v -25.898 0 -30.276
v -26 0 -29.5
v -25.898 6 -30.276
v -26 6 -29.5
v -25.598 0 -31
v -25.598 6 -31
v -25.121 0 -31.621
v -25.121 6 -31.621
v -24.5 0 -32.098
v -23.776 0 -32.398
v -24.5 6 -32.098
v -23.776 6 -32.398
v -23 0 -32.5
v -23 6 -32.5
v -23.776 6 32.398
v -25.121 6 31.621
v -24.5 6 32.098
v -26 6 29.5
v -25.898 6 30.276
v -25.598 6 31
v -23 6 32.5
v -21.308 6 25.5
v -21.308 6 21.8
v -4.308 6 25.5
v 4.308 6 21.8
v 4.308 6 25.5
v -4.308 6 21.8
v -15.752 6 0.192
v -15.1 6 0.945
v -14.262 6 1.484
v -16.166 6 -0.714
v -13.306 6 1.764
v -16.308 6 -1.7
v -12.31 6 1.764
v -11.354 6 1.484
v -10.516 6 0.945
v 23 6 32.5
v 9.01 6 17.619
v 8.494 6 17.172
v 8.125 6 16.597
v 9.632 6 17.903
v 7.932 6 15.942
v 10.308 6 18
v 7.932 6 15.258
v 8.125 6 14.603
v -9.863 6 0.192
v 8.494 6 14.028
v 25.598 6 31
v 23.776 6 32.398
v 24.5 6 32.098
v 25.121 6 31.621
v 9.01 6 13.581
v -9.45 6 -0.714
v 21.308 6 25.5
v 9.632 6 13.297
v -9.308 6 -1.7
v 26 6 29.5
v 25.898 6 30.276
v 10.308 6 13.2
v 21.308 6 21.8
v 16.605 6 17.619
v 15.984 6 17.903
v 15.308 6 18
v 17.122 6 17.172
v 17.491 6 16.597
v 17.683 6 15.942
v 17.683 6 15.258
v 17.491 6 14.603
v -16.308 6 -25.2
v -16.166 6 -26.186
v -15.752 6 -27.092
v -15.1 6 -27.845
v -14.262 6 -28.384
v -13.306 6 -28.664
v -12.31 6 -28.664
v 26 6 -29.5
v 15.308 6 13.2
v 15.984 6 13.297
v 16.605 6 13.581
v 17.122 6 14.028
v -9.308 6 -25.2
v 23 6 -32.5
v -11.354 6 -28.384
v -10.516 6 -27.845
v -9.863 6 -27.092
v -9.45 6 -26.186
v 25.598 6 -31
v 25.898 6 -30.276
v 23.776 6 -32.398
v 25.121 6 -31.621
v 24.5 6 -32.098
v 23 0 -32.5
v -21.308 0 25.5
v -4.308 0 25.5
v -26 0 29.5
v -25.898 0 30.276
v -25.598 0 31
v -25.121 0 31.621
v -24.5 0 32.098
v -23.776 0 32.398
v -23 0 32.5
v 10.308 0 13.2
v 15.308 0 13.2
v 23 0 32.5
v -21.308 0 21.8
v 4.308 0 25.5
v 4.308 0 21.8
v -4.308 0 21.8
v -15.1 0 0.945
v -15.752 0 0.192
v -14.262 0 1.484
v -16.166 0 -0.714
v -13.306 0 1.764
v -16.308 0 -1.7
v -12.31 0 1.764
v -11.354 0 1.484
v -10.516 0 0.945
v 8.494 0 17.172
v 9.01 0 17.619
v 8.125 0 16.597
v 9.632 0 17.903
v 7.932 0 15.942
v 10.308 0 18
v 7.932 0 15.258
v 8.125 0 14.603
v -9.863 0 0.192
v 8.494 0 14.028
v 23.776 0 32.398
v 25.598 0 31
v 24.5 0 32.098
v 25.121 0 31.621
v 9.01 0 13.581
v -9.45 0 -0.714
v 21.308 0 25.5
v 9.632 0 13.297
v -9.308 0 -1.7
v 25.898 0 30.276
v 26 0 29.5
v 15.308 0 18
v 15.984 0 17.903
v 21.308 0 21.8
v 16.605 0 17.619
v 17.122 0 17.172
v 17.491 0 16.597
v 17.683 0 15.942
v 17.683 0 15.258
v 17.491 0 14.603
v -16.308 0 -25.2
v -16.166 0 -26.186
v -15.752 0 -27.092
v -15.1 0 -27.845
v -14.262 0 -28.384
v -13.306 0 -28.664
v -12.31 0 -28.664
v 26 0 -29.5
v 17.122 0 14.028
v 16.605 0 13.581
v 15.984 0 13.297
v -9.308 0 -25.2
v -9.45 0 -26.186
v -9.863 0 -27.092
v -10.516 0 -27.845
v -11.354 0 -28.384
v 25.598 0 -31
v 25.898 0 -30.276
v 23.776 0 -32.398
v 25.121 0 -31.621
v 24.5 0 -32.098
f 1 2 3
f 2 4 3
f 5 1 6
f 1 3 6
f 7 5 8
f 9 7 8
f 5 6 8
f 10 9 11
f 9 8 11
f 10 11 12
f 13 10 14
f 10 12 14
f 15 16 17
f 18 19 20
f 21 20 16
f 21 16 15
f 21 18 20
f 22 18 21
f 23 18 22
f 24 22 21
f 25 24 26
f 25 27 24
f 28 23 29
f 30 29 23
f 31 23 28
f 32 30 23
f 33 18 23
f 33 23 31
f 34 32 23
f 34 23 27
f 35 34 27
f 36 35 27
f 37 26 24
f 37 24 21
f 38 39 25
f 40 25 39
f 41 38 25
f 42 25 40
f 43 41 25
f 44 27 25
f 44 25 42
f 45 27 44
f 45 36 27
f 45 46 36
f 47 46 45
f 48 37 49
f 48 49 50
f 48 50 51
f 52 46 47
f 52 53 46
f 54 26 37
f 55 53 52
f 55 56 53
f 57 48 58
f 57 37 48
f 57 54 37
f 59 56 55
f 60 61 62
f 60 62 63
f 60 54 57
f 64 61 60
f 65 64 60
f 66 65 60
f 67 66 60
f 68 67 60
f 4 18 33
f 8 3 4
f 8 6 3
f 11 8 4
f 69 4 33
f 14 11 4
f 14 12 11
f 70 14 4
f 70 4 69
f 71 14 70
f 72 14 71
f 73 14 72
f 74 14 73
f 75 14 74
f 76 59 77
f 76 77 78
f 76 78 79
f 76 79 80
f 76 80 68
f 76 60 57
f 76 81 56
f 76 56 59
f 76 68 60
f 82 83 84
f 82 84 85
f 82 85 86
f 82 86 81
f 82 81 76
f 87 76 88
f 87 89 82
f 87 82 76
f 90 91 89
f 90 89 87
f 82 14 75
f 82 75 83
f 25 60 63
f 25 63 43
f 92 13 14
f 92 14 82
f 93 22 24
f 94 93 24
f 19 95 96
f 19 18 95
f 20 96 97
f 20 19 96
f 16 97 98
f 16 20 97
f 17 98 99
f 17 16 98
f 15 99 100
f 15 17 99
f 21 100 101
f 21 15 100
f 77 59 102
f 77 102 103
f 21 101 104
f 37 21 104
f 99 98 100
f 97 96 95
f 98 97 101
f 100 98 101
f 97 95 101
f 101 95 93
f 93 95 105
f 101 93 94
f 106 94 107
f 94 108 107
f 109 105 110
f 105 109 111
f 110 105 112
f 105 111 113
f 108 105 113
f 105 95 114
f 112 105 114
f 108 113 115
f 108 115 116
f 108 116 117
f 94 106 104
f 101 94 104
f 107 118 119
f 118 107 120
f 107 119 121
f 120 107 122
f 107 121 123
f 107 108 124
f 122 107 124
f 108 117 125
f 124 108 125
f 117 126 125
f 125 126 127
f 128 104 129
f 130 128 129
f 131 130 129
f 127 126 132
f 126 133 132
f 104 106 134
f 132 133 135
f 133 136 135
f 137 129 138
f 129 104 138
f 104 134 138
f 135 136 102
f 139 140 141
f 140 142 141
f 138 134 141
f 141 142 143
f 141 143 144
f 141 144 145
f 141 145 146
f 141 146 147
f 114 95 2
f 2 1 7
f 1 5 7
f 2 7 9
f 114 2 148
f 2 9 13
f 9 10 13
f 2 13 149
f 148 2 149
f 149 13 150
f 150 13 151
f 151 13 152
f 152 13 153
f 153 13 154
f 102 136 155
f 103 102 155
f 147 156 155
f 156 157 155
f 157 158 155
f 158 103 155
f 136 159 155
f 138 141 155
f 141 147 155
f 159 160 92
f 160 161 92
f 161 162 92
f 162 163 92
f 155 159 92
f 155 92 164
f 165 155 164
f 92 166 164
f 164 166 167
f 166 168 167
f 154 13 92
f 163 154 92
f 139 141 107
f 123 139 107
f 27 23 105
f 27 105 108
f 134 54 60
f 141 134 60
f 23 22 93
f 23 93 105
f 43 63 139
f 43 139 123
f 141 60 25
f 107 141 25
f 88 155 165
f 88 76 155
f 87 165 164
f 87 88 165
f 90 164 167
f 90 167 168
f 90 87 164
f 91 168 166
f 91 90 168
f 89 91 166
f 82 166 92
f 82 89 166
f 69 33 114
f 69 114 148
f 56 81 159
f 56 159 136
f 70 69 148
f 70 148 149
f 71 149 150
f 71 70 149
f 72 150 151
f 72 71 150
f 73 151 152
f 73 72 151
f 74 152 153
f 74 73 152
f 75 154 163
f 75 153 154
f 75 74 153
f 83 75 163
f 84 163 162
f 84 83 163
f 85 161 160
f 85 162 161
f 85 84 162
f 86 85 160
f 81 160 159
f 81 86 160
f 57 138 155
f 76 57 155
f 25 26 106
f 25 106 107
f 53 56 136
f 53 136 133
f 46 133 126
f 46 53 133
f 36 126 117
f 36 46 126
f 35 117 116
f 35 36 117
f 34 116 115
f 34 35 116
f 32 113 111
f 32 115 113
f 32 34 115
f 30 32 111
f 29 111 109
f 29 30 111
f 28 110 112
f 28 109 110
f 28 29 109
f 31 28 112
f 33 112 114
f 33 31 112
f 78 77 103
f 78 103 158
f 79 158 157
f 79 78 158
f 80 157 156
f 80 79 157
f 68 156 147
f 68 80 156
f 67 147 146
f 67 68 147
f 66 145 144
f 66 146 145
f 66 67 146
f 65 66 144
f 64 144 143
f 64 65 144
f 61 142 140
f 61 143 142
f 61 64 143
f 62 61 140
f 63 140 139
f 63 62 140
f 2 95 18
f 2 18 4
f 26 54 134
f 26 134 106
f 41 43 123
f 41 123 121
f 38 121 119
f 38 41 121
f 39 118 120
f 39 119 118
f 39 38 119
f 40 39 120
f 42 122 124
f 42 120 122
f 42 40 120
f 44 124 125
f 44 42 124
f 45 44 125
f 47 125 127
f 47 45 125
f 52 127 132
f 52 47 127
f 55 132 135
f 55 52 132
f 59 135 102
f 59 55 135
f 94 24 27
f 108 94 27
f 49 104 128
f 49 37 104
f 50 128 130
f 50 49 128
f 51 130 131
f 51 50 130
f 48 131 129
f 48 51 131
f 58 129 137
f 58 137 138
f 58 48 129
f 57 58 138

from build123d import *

# Parameters (mm, degrees)
SKETCH1_W           = 52
SKETCH1_H           = 65
BOSS_EXTRUDE1_DEPTH = 6
FILLET1_R           = 3
SKETCH4_W           = 17
SKETCH4_H           = 3.7
CUT_EXTRUDE1_DEPTH  = 7
CUT_EXTRUDE2_DEPTH  = 7
CUT_EXTRUDE3_DEPTH  = 7


with BuildPart() as part:
    # Sketch1 → Boss-Extrude1 (new body)
    with BuildSketch(Plane(origin=(0, 0, 0), x_dir=(1, 0, 0), z_dir=(0, 1, 0))):
        Rectangle(SKETCH1_W, SKETCH1_H)
    extrude(amount=BOSS_EXTRUDE1_DEPTH)

    # Fillet1
    fillet1_edges = [part.edges().sort_by_distance(p)[0] for p in [
        (26, 3, 32.5),
        (-26, 3, 32.5),
        (-26, 3, -32.5),
        (26, 3, -32.5),
    ]]
    fillet(fillet1_edges, radius=FILLET1_R)

    # Sketch4 → Cut-Extrude1 (cut, through all)
    with BuildSketch(Plane(origin=(0, 6, 0), x_dir=(1, 0, 0), z_dir=(0, 1, 0))):
        with Locations((-12.807771524, -23.65)):
            Rectangle(SKETCH4_W, SKETCH4_H)
    cut_extrude1 = extrude(amount=-CUT_EXTRUDE1_DEPTH, mode=Mode.SUBTRACT)

    # Mirror2: Cut-Extrude1 across plane
    add(cut_extrude1.mirror(Plane(origin=(0, 0, 0), x_dir=(0, 0, 1), z_dir=(1, 0, 0))), mode=Mode.SUBTRACT)

    # Sketch5 → Cut-Extrude2 (cut, through all)
    with BuildSketch(Plane(origin=(0, 6, 0), x_dir=(1, 0, 0), z_dir=(0, 1, 0))):
        with BuildLine():
            Line((10.307771524, -13.2), (15.307771524, -13.2))
            ThreePointArc((15.307771524, -13.2), (17.707771524, -15.6), (15.307771524, -18))
            Line((15.307771524, -18), (10.307771524, -18))
            ThreePointArc((10.307771524, -18), (7.907771524, -15.6), (10.307771524, -13.2))
        make_face()
    extrude(amount=-CUT_EXTRUDE2_DEPTH, mode=Mode.SUBTRACT)

    # Sketch6 → Cut-Extrude3 (cut, through all)
    with BuildSketch(Plane(origin=(0, 6, 0), x_dir=(1, 0, 0), z_dir=(0, 1, 0))):
        with BuildLine():
            Line((-9.307771524, 25.2), (-9.307771524, 1.7))
            ThreePointArc((-9.307771524, 1.7), (-12.807771524, -1.8), (-16.307771524, 1.7))
            Line((-16.307771524, 1.7), (-16.307771524, 25.2))
            ThreePointArc((-16.307771524, 25.2), (-12.807771524, 28.7), (-9.307771524, 25.2))
        make_face()
    extrude(amount=-CUT_EXTRUDE3_DEPTH, mode=Mode.SUBTRACT)


solid = part.part
